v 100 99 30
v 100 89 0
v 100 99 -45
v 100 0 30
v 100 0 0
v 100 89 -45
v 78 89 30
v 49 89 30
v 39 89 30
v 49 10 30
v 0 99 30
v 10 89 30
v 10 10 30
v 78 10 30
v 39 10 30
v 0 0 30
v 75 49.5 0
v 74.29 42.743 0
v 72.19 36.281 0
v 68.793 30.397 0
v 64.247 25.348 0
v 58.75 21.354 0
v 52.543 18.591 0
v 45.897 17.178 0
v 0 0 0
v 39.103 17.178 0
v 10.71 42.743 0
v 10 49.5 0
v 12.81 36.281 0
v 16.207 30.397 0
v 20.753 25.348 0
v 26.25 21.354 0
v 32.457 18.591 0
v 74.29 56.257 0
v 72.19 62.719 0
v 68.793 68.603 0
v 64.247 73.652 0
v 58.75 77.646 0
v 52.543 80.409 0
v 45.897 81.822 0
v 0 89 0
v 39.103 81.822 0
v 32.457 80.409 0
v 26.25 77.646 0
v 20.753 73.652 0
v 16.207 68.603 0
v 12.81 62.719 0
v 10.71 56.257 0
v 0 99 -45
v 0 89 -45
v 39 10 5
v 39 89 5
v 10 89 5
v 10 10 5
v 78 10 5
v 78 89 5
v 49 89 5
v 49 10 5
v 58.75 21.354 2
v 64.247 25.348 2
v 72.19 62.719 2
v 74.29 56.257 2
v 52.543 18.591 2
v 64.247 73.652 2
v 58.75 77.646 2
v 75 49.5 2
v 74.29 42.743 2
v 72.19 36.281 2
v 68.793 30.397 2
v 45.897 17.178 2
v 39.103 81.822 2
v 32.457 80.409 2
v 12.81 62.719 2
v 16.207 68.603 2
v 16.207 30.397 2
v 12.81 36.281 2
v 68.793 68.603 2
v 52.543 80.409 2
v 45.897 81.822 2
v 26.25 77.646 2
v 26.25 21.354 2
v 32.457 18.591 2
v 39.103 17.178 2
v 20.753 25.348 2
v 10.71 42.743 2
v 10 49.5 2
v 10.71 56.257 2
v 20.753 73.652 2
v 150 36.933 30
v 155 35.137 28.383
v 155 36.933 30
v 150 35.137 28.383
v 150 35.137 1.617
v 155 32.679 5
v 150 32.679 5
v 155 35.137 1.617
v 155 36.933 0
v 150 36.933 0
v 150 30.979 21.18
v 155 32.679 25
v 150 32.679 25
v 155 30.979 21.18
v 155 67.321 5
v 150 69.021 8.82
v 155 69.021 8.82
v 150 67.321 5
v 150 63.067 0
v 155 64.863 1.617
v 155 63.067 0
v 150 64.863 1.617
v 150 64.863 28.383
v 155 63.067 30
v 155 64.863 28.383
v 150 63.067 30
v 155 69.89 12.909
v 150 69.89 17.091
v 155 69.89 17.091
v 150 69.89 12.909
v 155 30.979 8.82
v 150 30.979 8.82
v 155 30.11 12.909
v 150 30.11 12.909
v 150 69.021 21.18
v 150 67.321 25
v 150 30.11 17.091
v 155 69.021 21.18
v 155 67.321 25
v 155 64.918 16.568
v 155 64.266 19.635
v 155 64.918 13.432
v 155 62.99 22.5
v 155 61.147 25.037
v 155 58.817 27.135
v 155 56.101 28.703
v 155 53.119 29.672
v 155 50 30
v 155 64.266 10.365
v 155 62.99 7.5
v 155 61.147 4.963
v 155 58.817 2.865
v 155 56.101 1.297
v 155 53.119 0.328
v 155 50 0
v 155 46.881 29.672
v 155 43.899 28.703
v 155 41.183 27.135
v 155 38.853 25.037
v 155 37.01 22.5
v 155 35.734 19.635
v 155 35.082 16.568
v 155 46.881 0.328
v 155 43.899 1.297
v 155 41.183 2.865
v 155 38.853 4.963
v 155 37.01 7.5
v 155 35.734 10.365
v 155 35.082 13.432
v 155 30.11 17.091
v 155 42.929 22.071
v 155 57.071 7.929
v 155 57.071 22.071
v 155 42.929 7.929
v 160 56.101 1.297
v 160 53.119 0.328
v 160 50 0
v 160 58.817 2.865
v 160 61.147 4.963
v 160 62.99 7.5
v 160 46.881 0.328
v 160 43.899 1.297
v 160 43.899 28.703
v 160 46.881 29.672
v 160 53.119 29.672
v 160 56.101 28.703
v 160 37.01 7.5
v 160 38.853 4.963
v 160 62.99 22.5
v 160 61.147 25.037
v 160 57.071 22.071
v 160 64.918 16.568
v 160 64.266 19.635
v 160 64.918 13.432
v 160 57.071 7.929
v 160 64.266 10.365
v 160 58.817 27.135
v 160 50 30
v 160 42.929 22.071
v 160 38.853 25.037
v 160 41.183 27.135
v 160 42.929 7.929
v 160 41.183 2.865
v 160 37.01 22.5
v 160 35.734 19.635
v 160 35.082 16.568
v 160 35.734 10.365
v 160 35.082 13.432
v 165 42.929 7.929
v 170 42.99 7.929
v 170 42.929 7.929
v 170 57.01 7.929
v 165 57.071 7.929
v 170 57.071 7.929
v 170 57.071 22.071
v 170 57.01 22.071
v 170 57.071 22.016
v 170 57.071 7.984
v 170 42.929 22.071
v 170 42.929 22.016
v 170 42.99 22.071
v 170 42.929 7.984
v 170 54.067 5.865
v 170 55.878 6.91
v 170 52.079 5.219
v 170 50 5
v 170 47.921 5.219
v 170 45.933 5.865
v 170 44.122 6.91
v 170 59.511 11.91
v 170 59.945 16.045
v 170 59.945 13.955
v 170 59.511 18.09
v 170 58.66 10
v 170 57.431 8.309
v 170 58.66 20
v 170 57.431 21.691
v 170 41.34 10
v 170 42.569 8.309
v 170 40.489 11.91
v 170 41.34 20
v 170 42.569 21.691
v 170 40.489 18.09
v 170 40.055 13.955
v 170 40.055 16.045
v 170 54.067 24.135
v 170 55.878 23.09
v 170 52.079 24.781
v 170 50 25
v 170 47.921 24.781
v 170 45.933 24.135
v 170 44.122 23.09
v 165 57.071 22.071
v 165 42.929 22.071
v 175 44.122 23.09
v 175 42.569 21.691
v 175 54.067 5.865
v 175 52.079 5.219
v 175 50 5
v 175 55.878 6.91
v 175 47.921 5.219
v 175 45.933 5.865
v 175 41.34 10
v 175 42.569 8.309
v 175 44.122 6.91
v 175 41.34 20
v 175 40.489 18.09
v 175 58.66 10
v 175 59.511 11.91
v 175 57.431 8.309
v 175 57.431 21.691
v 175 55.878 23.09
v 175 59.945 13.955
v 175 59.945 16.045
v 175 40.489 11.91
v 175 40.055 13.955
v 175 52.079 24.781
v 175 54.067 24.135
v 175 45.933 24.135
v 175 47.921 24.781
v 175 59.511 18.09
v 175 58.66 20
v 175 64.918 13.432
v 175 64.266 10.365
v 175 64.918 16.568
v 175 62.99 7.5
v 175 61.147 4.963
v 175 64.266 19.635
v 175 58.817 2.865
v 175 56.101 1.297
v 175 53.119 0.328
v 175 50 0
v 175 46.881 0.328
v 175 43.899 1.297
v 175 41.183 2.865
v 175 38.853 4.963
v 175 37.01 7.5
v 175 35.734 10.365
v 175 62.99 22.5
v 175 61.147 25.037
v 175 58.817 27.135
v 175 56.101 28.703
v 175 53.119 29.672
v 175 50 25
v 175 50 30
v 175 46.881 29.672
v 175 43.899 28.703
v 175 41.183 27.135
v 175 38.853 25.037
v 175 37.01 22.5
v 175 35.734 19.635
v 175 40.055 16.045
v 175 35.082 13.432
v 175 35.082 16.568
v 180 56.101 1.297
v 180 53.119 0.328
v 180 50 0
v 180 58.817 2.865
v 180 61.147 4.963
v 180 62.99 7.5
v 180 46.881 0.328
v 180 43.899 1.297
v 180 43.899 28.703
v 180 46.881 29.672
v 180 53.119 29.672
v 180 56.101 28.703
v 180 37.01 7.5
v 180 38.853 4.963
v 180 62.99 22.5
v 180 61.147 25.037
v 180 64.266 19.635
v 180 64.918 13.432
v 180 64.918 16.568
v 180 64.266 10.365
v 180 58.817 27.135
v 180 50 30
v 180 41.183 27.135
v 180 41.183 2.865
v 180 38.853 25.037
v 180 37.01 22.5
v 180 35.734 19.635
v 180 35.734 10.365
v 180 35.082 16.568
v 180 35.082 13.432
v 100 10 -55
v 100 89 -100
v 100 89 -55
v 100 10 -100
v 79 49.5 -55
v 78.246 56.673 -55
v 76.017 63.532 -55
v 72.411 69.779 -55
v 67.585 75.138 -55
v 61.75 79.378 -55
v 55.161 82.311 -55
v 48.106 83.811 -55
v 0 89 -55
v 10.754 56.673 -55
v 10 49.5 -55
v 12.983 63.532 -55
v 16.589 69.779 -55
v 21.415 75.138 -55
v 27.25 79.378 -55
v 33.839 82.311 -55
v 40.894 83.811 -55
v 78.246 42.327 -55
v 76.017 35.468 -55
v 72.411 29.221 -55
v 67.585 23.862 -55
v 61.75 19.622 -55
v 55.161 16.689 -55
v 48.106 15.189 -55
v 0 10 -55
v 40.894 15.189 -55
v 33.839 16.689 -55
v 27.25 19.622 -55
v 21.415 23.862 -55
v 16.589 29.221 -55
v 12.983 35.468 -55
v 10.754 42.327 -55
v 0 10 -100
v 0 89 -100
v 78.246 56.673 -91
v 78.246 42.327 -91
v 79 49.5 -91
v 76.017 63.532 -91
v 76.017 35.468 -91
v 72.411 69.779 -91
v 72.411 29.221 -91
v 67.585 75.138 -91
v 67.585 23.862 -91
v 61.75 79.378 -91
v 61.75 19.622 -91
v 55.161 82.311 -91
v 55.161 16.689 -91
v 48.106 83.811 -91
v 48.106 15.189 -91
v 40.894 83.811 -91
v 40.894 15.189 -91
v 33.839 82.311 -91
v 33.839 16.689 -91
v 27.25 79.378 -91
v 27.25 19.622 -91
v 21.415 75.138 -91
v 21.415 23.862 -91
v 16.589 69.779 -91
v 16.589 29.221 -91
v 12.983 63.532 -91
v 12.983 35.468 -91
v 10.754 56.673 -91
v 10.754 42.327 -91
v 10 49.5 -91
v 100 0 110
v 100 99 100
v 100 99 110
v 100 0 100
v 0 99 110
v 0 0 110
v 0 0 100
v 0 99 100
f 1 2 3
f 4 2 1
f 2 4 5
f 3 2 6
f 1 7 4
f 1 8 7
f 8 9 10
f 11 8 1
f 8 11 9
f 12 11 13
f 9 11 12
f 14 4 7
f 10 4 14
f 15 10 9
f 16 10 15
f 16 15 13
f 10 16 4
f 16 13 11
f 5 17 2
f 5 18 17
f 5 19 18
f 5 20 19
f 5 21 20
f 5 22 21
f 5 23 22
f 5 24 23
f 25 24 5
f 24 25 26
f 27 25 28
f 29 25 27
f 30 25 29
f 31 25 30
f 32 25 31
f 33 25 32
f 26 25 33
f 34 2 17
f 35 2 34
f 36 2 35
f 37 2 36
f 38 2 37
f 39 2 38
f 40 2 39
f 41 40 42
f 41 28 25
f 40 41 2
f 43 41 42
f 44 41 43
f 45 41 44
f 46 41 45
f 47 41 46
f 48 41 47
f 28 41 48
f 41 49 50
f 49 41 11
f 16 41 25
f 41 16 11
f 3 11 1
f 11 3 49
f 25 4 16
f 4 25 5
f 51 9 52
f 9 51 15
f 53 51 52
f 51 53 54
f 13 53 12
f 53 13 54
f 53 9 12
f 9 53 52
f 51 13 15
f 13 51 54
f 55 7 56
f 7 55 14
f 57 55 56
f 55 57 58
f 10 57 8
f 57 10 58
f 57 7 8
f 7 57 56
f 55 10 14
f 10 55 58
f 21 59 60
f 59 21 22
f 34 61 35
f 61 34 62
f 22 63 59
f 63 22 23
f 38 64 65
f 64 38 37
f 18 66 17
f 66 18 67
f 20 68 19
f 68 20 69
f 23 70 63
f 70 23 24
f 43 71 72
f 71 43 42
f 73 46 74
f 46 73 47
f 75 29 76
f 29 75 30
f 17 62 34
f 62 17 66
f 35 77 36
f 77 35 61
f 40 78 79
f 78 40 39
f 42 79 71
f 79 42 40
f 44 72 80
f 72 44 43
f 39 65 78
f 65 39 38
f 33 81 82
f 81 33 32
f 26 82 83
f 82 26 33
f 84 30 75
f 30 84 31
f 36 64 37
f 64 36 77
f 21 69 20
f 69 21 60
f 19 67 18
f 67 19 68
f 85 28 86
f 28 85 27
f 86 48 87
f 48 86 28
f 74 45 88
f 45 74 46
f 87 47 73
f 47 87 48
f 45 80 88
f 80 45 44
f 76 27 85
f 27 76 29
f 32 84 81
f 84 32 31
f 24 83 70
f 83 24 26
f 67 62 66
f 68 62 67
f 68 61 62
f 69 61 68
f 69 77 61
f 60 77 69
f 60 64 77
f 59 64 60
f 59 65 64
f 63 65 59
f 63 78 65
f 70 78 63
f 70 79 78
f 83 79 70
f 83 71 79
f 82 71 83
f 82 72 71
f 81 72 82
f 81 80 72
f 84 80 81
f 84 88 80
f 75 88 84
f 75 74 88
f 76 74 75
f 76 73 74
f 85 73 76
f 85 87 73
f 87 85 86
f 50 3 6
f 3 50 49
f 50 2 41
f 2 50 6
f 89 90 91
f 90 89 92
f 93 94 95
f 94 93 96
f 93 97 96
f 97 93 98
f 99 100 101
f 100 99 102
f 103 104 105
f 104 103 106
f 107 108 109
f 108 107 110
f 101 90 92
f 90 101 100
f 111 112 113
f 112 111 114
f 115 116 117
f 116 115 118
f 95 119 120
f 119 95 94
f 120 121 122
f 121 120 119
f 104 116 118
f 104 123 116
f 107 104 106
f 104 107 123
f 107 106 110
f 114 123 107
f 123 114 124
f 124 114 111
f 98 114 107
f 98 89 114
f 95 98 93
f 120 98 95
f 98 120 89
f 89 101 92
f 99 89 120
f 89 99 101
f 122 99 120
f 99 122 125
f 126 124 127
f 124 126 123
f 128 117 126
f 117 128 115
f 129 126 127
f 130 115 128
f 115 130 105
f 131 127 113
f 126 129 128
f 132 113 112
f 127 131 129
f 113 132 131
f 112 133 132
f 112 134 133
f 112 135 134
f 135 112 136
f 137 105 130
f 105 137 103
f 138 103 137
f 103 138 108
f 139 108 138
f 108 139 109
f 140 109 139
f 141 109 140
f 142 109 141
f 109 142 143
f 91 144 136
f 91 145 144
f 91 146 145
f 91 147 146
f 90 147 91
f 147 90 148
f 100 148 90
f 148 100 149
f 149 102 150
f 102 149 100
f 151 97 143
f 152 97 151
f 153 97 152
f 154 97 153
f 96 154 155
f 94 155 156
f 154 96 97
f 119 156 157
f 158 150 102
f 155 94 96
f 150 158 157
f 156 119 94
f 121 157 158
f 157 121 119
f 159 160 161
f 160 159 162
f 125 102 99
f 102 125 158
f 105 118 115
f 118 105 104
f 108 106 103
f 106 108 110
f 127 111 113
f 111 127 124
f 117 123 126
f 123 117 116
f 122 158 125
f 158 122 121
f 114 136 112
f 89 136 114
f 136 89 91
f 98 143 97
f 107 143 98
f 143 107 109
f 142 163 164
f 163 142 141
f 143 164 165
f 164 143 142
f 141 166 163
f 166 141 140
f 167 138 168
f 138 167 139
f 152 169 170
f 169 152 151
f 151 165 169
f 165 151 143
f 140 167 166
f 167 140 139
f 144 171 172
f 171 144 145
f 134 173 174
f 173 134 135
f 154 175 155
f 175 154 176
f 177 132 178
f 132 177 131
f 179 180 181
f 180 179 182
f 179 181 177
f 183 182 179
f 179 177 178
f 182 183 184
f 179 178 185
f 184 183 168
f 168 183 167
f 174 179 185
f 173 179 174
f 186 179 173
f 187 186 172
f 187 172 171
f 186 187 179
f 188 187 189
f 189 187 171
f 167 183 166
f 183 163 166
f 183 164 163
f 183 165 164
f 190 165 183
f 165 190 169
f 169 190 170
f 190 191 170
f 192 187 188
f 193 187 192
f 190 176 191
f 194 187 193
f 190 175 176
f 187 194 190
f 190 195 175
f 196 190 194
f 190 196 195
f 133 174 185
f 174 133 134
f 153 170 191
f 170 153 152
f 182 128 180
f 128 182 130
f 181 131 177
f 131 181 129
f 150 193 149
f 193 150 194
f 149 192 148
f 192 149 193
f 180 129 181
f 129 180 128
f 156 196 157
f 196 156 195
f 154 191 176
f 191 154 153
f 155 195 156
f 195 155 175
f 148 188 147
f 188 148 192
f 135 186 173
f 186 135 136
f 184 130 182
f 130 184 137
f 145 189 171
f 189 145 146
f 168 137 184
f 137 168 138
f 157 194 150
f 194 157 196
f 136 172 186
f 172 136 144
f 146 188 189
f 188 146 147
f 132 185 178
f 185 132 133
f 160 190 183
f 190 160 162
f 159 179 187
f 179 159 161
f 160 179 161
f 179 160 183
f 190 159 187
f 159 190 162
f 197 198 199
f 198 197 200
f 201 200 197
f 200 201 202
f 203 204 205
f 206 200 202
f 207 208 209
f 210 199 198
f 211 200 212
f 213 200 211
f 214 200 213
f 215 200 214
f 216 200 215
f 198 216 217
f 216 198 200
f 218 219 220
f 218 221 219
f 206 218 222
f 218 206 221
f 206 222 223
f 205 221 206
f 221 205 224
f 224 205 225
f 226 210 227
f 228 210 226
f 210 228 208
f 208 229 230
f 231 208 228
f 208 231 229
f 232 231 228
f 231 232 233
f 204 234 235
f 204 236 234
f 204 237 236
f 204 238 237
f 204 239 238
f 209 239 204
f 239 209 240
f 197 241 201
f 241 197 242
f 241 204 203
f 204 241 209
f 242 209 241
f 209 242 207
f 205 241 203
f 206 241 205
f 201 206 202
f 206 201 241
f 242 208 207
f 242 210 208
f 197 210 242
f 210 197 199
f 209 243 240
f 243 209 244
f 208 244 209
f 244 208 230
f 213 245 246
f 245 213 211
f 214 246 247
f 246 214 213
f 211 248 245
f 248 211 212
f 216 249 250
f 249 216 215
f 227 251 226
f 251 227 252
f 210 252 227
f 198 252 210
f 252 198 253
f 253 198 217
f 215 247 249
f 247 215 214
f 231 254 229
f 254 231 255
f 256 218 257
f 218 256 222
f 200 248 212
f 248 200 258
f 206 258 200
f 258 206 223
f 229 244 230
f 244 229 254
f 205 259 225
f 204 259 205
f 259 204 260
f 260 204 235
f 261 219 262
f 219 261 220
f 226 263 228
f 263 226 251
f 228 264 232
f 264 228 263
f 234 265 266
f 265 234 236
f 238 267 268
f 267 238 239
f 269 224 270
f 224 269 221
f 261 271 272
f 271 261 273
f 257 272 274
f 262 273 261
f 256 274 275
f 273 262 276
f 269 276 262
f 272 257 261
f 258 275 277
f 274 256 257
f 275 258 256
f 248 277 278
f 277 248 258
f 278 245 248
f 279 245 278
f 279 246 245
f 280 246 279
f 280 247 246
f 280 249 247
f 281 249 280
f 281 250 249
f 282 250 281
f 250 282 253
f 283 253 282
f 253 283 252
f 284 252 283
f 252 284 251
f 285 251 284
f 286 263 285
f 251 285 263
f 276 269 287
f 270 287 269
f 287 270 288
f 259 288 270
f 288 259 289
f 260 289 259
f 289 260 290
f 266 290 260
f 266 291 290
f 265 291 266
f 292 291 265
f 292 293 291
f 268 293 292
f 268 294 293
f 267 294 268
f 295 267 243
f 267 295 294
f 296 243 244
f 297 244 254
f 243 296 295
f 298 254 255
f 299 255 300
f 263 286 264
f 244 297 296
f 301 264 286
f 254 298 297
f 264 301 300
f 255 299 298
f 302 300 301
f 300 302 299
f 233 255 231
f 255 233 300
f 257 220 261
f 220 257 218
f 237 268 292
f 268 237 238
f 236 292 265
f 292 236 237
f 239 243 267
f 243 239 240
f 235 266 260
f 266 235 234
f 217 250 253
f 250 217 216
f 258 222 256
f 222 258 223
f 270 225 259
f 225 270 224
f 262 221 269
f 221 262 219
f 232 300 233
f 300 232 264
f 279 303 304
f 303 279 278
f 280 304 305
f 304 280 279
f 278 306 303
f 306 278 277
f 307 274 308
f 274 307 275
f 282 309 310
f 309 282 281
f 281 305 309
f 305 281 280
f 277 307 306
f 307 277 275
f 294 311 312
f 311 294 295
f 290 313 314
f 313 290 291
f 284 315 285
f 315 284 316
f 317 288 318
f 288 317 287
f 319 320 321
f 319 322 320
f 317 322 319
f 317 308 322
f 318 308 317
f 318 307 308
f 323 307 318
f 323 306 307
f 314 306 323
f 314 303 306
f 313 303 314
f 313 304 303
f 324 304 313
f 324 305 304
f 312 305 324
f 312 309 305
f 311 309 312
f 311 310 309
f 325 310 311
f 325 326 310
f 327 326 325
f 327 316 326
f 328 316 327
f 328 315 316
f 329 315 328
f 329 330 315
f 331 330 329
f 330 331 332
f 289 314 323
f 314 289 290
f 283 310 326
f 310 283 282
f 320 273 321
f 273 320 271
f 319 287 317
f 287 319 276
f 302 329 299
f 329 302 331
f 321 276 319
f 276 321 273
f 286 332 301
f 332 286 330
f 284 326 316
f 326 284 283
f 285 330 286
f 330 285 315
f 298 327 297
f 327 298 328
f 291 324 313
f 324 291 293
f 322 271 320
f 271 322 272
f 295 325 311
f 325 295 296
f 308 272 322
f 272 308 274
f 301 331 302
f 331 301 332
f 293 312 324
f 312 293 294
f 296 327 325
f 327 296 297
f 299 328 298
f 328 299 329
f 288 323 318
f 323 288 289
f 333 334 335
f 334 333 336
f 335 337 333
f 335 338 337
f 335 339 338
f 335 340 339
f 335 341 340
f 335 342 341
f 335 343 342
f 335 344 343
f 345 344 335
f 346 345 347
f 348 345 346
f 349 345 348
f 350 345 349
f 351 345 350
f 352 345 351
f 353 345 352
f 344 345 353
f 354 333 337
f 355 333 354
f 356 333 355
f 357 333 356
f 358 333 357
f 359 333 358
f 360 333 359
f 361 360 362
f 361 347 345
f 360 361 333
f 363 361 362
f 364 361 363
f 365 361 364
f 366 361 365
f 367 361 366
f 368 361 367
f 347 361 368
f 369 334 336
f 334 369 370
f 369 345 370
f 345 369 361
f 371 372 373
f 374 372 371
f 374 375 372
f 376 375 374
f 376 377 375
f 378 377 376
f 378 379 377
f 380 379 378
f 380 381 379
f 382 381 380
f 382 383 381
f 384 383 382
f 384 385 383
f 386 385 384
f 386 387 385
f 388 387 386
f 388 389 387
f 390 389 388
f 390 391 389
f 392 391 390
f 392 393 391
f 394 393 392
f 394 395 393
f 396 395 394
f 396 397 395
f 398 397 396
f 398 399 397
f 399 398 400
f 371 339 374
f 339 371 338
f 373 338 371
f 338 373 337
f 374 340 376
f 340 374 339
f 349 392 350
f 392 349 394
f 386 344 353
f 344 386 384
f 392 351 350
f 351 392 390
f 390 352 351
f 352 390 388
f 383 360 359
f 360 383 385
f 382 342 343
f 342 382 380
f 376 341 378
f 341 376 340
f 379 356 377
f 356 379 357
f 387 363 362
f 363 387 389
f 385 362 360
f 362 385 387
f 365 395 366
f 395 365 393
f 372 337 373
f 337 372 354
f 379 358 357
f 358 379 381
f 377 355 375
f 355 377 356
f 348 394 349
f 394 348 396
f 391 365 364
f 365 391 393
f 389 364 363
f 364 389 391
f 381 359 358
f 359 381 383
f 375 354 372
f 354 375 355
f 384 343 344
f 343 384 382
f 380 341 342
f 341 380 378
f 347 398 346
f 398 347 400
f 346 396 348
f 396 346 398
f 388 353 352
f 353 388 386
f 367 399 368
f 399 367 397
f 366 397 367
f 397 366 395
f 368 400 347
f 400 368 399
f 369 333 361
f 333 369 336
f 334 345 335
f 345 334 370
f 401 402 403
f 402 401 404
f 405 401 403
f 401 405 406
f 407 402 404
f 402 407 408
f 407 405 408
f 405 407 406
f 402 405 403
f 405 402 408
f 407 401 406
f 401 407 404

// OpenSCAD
/* stamp box prototype 2
 *
 * 2016/5/15
 */

sw=25;         // stamp width & height
sl=75;         // stamp length
ipd=65;        // inkpad diameter
iph=38;        // inkpad height

dt=2;          // damping pad thickness

l=100;         // length
w=sl+dt*2+20;  // width
l1h=30;        // layer 1 height
l2h=45;        // layer 2 height

module layer1(){
    cube([l,w,10]);
}

module layer2(){
    difference(){
        cube([l,w,l1h]);
        sv=[sw+dt*2,sl+dt*2,sw];
        translate([10+sv[0]/2,w/2,l1h-sv[2]/2])   cube(sv,true);
        translate([20+sv[0]/2*3,w/2,l1h-sv[2]/2]) cube(sv,true);
        //damping
        translate([10+ipd/2,w/2,0]) cylinder(d=ipd,h=dt);
    }
    
    %translate([0,0,-l2h]) cube([l,10,l2h]);
    translate([0,w-10,-l2h]) cube([l,10,l2h]);
}

module layer3(){
    difference(){
        cube([l,w,l2h]);
        d=ipd+dt*2;
        translate([10+d/2,w/2,l2h-iph+dt]) cylinder(d=d,h=iph);
        
        cube([l,10,l2h]);
        translate([0,w-10,0]) cube([l,10,l2h]);
    }
}

lkod=30;    // locker outside diameter
lkmd=20;    // locker middle diameter
lkid=40;    // locker inside diameter
lklt=5;     // locker layer thickness
// locker connect object
module lockerslot(){
    w=sqrt(lkmd*lkmd/2);
    translate([0,0,lklt/2]) cube([w,w,lklt],true);
}

// lock inside part
module lockeri(){
    difference(){
        cylinder(d=lkid,h=lklt);
        // lock
        w=(lkid-lkod)/2;
        translate([-lkid/2, -lkid/2,0]) cube([w,lkid,20]);
        translate([lkid/2-w,-lkid/2,0]) cube([w,lkid,20]);
    }
    difference(){
        translate([0,0,lklt]) cylinder(d=lkod,h=lklt);
        translate([0,0,lklt]) lockerslot();
    }
}

// locker outside part
module lockero(){
    translate([0,0,-lklt]) lockerslot();
    translate([0,0,0]) cylinder(d=lkmd,h=lklt);
    translate([0,0,lklt]) cylinder(d=lkod,h=lklt);
}

// box locker
module locker(){
    color("lightgreen") rotate([0,90,0]){
        lockeri();
        translate([0,0,20]) lockero();
    }
}


translate([0,0,100]) layer1();
layer2();
translate([150,50,15]) locker();
translate([0,0,-100]) layer3();
